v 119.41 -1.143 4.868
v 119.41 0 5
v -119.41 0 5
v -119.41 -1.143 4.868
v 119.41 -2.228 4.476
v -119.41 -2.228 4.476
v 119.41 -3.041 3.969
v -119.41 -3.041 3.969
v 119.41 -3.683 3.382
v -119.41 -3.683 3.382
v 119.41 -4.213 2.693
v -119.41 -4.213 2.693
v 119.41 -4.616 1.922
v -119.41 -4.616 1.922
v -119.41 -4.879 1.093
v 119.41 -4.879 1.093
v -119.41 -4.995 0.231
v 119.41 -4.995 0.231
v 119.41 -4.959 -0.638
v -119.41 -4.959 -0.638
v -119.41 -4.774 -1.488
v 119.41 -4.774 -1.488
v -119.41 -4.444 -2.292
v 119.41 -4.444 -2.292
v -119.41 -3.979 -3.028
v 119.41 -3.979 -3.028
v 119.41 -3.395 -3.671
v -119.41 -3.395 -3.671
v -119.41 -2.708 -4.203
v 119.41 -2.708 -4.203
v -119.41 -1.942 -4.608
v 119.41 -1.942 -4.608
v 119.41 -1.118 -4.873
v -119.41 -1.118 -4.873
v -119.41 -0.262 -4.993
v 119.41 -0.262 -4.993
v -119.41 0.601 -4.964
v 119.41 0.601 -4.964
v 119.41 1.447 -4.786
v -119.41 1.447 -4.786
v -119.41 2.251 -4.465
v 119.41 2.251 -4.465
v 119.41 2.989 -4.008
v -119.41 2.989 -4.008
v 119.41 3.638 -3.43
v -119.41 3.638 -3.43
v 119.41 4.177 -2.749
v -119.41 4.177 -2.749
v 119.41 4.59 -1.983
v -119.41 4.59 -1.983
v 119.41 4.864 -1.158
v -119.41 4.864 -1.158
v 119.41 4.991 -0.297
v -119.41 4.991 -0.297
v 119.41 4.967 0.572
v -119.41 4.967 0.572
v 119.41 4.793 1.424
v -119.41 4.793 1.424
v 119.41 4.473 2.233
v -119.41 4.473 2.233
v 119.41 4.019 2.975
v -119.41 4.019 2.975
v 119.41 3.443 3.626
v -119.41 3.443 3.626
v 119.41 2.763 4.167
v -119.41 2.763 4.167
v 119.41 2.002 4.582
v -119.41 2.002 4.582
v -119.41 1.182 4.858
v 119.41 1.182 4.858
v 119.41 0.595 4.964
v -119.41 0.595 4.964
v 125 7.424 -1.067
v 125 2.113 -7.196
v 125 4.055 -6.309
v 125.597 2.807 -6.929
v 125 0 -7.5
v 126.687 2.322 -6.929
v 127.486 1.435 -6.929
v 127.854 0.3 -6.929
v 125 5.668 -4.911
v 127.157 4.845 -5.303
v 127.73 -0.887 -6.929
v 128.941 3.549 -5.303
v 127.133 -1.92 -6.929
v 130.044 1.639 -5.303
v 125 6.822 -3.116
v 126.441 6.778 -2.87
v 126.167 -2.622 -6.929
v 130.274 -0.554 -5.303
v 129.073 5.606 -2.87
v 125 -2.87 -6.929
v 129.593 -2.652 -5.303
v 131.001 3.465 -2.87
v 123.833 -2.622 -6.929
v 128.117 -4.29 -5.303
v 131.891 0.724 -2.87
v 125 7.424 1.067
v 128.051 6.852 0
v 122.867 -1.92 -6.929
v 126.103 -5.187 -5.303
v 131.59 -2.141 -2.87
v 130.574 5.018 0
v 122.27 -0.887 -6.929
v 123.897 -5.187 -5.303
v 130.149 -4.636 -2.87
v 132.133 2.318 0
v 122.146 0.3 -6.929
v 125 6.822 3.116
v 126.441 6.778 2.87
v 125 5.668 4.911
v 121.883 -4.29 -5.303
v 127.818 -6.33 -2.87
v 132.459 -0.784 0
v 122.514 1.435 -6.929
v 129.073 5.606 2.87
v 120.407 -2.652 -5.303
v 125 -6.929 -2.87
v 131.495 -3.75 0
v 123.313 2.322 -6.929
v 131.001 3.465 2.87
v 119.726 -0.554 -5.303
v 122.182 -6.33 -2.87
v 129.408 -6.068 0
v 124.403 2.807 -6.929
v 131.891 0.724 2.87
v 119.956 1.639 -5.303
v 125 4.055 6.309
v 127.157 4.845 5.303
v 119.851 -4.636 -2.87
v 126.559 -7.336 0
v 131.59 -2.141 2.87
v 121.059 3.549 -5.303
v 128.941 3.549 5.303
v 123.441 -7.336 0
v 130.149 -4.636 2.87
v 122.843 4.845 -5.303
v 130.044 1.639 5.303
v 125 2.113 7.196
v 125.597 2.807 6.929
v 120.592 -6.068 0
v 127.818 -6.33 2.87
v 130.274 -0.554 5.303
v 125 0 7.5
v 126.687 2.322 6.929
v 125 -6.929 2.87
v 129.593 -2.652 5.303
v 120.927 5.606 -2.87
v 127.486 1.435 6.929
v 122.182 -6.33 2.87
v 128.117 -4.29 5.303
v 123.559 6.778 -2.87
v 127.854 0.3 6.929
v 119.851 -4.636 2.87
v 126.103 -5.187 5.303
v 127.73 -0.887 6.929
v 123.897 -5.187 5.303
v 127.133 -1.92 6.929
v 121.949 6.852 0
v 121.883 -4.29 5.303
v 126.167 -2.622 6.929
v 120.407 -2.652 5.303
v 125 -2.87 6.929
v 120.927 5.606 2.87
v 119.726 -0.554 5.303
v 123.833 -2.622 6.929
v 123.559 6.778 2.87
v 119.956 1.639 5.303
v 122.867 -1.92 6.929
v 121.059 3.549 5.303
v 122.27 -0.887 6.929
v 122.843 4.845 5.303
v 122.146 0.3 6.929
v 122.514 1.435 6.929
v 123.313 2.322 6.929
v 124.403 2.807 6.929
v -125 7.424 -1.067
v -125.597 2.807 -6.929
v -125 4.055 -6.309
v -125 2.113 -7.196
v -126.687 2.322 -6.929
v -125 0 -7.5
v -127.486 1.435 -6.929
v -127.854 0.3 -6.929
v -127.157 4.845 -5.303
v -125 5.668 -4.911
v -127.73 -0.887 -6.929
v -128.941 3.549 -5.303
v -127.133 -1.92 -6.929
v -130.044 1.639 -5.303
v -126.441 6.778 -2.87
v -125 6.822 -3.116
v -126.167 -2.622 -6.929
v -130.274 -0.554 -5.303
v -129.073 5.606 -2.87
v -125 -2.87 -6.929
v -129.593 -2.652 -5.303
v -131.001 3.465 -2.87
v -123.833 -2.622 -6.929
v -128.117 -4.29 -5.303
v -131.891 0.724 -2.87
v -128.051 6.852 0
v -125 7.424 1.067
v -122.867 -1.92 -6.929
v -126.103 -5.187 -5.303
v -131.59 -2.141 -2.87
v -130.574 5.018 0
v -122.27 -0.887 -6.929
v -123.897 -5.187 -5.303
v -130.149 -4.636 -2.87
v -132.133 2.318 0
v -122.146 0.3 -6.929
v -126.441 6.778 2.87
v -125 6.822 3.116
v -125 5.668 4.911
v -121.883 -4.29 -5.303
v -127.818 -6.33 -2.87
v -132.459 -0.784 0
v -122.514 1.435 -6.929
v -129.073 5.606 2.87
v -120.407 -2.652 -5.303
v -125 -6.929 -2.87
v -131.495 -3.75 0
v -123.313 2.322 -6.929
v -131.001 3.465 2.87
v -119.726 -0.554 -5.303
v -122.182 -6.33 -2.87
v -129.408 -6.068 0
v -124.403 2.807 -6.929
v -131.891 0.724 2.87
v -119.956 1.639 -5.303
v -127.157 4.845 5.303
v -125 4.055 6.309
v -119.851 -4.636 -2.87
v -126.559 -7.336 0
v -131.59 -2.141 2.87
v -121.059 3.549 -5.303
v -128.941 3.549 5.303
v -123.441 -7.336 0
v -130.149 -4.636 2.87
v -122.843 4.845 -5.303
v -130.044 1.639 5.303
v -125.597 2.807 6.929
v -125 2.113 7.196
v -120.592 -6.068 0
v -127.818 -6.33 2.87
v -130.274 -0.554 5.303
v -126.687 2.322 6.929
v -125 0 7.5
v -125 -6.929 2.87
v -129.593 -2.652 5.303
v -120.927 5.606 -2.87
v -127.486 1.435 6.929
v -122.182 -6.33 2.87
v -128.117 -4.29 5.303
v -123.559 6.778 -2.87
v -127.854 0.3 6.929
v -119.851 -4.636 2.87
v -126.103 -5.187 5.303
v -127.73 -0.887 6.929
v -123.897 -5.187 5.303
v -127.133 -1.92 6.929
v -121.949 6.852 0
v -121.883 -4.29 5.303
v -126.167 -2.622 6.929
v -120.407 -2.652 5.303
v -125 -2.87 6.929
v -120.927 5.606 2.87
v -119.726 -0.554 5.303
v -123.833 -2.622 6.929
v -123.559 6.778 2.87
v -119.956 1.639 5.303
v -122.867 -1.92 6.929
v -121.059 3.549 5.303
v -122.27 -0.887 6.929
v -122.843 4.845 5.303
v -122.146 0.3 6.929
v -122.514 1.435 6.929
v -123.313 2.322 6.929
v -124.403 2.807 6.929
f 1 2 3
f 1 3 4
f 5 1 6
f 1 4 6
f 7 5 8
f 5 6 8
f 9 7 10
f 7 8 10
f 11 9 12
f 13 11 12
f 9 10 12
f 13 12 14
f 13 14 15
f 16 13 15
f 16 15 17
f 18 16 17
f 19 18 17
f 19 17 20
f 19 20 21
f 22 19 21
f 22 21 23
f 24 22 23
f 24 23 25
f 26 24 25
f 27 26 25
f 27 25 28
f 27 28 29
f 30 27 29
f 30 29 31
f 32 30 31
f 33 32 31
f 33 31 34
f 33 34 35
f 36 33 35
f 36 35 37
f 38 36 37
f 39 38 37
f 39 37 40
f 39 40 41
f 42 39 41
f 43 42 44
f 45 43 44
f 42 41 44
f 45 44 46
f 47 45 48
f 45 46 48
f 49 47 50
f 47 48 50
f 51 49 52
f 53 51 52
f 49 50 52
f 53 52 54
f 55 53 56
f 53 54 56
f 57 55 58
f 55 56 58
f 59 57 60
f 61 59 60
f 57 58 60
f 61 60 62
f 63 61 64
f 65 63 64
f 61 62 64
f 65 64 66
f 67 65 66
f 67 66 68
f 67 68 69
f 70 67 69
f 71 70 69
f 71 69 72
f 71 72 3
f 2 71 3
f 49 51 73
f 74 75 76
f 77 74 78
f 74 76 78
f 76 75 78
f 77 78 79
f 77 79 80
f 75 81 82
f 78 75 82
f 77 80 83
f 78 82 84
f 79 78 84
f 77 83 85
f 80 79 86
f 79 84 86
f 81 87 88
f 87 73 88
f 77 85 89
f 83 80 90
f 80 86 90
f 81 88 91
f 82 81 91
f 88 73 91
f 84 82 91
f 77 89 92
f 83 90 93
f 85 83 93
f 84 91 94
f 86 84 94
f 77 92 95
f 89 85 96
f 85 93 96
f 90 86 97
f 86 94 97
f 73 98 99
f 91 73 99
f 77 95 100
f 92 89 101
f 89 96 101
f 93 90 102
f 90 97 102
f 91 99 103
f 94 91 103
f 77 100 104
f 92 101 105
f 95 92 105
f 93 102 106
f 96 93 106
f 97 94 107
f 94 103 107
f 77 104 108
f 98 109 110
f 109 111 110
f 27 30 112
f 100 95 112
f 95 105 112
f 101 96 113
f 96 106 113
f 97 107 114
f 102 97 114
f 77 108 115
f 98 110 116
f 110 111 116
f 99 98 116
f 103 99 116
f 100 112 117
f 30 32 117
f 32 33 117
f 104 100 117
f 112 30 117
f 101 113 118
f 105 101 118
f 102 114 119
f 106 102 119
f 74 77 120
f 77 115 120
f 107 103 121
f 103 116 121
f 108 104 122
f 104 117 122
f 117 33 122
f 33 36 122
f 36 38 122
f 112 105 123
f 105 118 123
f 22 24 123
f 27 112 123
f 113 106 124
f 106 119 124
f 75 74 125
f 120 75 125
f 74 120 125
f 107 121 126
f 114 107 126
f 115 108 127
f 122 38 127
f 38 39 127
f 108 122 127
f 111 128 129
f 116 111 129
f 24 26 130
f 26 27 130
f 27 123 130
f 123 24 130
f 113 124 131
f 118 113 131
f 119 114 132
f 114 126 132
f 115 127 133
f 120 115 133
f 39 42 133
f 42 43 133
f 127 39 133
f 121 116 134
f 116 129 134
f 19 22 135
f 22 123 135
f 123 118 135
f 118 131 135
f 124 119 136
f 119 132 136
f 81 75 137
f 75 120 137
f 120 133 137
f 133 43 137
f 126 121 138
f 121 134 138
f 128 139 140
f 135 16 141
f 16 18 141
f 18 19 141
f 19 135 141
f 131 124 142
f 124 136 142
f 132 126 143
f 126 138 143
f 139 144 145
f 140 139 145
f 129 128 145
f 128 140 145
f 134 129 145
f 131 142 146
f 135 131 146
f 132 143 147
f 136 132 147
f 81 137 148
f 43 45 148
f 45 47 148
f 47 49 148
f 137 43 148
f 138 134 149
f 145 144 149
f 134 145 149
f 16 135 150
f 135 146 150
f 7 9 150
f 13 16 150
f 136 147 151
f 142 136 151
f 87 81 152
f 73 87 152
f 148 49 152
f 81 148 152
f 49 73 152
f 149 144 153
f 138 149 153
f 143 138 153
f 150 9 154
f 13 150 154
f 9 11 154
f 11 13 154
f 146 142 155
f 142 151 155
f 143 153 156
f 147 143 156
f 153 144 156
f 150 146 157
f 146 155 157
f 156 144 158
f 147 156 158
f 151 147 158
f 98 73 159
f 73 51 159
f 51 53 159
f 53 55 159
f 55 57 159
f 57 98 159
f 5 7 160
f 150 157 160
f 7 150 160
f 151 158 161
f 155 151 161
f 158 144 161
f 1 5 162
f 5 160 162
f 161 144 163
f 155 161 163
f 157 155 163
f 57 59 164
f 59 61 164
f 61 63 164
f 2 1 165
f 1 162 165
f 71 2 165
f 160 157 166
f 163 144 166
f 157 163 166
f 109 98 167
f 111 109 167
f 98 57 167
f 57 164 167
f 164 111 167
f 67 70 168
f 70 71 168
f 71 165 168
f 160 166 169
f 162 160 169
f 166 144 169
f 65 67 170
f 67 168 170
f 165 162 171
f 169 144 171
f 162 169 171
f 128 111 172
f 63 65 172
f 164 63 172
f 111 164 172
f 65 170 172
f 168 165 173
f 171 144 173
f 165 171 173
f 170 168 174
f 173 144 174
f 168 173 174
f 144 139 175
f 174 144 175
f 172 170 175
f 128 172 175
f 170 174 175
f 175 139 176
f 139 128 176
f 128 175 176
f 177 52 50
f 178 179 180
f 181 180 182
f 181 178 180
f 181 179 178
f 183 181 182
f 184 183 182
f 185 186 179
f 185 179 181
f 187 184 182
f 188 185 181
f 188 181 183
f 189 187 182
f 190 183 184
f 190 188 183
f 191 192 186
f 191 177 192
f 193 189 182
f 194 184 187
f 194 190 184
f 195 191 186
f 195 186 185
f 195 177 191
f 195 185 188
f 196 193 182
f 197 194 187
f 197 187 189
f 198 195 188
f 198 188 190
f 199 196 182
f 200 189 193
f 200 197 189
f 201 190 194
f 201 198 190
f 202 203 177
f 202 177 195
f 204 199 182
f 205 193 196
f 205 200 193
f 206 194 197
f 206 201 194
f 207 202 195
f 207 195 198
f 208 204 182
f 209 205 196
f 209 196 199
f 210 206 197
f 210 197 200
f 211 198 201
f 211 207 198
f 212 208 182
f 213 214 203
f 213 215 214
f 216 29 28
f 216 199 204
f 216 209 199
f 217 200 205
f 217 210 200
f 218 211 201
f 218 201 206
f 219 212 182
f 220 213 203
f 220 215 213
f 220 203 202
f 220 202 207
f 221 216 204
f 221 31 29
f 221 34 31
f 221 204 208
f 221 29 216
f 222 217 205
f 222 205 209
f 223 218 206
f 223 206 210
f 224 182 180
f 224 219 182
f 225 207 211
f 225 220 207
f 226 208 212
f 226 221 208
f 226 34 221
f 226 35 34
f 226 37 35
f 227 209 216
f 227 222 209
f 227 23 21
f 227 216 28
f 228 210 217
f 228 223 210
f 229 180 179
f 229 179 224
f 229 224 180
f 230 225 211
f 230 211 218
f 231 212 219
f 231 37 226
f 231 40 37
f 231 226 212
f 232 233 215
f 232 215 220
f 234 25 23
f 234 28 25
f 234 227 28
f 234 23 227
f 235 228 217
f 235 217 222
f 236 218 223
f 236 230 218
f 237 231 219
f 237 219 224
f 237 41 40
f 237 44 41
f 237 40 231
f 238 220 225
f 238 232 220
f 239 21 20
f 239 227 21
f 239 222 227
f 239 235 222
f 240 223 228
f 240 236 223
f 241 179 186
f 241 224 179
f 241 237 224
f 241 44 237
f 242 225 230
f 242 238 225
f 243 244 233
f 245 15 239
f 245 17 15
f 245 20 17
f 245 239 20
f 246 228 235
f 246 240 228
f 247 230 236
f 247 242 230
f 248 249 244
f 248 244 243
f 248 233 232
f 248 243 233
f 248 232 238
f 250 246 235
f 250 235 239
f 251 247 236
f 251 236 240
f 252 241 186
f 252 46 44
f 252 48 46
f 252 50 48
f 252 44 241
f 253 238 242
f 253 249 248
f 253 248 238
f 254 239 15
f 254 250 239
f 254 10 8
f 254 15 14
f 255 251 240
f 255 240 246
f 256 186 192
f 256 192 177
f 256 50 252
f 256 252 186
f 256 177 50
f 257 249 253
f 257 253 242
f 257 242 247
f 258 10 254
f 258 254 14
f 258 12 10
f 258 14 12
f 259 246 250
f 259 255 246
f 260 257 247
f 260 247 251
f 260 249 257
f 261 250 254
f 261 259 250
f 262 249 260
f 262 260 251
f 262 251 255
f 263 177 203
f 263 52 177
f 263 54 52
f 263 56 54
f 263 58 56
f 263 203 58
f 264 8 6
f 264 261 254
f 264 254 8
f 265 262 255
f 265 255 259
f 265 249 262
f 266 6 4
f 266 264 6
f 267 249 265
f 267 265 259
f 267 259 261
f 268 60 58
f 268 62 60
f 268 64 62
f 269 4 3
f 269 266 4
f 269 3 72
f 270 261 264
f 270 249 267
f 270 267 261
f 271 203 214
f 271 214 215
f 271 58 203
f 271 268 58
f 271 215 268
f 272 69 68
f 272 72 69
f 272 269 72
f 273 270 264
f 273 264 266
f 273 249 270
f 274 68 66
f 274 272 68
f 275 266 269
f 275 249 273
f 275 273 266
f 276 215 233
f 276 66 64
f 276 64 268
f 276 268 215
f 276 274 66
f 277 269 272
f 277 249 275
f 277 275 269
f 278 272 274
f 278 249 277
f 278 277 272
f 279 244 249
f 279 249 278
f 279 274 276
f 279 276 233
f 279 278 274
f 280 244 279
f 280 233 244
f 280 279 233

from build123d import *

# Parameters (mm, degrees)
SZKIC1_W = 125
SZKIC1_H = 5


with BuildPart() as part:
    # Szkic1 → Obrót1 (revolve)
    with BuildSketch(Plane.XY, mode=Mode.PRIVATE) as obr_t1_sk:
        with Locations((62.5, 2.5)):
            Rectangle(SZKIC1_W, SZKIC1_H)
    obr_t1 = revolve(obr_t1_sk.sketch.rotate(Axis((0, 0, 0), (1, 0, 0)), 90), axis=Axis((0, 0, 0), (1, 0, 0)))

    # Szkic2 → Obrót3 (revolve)
    with BuildSketch(Plane(origin=(125, 0, 0), x_dir=(0, 0, -1), z_dir=(1, 0, 0))):
        with BuildLine():
            Line((-7.5, 0), (7.5, 0))
            ThreePointArc((7.5, 0), (0, 7.5), (-7.5, 0))
        make_face()
    obr_t3 = revolve(axis=Axis((125, 0, 7.5), (0, 0, -1)))

    # Lustro1: Obrót1, Obrót3 across plane
    add(obr_t1.mirror(Plane(origin=(0, 0, 0), x_dir=(0, 0, 1), z_dir=(1, 0, 0))))
    add(obr_t3.mirror(Plane(origin=(0, 0, 0), x_dir=(0, 0, 1), z_dir=(1, 0, 0))))


solid = part.part
